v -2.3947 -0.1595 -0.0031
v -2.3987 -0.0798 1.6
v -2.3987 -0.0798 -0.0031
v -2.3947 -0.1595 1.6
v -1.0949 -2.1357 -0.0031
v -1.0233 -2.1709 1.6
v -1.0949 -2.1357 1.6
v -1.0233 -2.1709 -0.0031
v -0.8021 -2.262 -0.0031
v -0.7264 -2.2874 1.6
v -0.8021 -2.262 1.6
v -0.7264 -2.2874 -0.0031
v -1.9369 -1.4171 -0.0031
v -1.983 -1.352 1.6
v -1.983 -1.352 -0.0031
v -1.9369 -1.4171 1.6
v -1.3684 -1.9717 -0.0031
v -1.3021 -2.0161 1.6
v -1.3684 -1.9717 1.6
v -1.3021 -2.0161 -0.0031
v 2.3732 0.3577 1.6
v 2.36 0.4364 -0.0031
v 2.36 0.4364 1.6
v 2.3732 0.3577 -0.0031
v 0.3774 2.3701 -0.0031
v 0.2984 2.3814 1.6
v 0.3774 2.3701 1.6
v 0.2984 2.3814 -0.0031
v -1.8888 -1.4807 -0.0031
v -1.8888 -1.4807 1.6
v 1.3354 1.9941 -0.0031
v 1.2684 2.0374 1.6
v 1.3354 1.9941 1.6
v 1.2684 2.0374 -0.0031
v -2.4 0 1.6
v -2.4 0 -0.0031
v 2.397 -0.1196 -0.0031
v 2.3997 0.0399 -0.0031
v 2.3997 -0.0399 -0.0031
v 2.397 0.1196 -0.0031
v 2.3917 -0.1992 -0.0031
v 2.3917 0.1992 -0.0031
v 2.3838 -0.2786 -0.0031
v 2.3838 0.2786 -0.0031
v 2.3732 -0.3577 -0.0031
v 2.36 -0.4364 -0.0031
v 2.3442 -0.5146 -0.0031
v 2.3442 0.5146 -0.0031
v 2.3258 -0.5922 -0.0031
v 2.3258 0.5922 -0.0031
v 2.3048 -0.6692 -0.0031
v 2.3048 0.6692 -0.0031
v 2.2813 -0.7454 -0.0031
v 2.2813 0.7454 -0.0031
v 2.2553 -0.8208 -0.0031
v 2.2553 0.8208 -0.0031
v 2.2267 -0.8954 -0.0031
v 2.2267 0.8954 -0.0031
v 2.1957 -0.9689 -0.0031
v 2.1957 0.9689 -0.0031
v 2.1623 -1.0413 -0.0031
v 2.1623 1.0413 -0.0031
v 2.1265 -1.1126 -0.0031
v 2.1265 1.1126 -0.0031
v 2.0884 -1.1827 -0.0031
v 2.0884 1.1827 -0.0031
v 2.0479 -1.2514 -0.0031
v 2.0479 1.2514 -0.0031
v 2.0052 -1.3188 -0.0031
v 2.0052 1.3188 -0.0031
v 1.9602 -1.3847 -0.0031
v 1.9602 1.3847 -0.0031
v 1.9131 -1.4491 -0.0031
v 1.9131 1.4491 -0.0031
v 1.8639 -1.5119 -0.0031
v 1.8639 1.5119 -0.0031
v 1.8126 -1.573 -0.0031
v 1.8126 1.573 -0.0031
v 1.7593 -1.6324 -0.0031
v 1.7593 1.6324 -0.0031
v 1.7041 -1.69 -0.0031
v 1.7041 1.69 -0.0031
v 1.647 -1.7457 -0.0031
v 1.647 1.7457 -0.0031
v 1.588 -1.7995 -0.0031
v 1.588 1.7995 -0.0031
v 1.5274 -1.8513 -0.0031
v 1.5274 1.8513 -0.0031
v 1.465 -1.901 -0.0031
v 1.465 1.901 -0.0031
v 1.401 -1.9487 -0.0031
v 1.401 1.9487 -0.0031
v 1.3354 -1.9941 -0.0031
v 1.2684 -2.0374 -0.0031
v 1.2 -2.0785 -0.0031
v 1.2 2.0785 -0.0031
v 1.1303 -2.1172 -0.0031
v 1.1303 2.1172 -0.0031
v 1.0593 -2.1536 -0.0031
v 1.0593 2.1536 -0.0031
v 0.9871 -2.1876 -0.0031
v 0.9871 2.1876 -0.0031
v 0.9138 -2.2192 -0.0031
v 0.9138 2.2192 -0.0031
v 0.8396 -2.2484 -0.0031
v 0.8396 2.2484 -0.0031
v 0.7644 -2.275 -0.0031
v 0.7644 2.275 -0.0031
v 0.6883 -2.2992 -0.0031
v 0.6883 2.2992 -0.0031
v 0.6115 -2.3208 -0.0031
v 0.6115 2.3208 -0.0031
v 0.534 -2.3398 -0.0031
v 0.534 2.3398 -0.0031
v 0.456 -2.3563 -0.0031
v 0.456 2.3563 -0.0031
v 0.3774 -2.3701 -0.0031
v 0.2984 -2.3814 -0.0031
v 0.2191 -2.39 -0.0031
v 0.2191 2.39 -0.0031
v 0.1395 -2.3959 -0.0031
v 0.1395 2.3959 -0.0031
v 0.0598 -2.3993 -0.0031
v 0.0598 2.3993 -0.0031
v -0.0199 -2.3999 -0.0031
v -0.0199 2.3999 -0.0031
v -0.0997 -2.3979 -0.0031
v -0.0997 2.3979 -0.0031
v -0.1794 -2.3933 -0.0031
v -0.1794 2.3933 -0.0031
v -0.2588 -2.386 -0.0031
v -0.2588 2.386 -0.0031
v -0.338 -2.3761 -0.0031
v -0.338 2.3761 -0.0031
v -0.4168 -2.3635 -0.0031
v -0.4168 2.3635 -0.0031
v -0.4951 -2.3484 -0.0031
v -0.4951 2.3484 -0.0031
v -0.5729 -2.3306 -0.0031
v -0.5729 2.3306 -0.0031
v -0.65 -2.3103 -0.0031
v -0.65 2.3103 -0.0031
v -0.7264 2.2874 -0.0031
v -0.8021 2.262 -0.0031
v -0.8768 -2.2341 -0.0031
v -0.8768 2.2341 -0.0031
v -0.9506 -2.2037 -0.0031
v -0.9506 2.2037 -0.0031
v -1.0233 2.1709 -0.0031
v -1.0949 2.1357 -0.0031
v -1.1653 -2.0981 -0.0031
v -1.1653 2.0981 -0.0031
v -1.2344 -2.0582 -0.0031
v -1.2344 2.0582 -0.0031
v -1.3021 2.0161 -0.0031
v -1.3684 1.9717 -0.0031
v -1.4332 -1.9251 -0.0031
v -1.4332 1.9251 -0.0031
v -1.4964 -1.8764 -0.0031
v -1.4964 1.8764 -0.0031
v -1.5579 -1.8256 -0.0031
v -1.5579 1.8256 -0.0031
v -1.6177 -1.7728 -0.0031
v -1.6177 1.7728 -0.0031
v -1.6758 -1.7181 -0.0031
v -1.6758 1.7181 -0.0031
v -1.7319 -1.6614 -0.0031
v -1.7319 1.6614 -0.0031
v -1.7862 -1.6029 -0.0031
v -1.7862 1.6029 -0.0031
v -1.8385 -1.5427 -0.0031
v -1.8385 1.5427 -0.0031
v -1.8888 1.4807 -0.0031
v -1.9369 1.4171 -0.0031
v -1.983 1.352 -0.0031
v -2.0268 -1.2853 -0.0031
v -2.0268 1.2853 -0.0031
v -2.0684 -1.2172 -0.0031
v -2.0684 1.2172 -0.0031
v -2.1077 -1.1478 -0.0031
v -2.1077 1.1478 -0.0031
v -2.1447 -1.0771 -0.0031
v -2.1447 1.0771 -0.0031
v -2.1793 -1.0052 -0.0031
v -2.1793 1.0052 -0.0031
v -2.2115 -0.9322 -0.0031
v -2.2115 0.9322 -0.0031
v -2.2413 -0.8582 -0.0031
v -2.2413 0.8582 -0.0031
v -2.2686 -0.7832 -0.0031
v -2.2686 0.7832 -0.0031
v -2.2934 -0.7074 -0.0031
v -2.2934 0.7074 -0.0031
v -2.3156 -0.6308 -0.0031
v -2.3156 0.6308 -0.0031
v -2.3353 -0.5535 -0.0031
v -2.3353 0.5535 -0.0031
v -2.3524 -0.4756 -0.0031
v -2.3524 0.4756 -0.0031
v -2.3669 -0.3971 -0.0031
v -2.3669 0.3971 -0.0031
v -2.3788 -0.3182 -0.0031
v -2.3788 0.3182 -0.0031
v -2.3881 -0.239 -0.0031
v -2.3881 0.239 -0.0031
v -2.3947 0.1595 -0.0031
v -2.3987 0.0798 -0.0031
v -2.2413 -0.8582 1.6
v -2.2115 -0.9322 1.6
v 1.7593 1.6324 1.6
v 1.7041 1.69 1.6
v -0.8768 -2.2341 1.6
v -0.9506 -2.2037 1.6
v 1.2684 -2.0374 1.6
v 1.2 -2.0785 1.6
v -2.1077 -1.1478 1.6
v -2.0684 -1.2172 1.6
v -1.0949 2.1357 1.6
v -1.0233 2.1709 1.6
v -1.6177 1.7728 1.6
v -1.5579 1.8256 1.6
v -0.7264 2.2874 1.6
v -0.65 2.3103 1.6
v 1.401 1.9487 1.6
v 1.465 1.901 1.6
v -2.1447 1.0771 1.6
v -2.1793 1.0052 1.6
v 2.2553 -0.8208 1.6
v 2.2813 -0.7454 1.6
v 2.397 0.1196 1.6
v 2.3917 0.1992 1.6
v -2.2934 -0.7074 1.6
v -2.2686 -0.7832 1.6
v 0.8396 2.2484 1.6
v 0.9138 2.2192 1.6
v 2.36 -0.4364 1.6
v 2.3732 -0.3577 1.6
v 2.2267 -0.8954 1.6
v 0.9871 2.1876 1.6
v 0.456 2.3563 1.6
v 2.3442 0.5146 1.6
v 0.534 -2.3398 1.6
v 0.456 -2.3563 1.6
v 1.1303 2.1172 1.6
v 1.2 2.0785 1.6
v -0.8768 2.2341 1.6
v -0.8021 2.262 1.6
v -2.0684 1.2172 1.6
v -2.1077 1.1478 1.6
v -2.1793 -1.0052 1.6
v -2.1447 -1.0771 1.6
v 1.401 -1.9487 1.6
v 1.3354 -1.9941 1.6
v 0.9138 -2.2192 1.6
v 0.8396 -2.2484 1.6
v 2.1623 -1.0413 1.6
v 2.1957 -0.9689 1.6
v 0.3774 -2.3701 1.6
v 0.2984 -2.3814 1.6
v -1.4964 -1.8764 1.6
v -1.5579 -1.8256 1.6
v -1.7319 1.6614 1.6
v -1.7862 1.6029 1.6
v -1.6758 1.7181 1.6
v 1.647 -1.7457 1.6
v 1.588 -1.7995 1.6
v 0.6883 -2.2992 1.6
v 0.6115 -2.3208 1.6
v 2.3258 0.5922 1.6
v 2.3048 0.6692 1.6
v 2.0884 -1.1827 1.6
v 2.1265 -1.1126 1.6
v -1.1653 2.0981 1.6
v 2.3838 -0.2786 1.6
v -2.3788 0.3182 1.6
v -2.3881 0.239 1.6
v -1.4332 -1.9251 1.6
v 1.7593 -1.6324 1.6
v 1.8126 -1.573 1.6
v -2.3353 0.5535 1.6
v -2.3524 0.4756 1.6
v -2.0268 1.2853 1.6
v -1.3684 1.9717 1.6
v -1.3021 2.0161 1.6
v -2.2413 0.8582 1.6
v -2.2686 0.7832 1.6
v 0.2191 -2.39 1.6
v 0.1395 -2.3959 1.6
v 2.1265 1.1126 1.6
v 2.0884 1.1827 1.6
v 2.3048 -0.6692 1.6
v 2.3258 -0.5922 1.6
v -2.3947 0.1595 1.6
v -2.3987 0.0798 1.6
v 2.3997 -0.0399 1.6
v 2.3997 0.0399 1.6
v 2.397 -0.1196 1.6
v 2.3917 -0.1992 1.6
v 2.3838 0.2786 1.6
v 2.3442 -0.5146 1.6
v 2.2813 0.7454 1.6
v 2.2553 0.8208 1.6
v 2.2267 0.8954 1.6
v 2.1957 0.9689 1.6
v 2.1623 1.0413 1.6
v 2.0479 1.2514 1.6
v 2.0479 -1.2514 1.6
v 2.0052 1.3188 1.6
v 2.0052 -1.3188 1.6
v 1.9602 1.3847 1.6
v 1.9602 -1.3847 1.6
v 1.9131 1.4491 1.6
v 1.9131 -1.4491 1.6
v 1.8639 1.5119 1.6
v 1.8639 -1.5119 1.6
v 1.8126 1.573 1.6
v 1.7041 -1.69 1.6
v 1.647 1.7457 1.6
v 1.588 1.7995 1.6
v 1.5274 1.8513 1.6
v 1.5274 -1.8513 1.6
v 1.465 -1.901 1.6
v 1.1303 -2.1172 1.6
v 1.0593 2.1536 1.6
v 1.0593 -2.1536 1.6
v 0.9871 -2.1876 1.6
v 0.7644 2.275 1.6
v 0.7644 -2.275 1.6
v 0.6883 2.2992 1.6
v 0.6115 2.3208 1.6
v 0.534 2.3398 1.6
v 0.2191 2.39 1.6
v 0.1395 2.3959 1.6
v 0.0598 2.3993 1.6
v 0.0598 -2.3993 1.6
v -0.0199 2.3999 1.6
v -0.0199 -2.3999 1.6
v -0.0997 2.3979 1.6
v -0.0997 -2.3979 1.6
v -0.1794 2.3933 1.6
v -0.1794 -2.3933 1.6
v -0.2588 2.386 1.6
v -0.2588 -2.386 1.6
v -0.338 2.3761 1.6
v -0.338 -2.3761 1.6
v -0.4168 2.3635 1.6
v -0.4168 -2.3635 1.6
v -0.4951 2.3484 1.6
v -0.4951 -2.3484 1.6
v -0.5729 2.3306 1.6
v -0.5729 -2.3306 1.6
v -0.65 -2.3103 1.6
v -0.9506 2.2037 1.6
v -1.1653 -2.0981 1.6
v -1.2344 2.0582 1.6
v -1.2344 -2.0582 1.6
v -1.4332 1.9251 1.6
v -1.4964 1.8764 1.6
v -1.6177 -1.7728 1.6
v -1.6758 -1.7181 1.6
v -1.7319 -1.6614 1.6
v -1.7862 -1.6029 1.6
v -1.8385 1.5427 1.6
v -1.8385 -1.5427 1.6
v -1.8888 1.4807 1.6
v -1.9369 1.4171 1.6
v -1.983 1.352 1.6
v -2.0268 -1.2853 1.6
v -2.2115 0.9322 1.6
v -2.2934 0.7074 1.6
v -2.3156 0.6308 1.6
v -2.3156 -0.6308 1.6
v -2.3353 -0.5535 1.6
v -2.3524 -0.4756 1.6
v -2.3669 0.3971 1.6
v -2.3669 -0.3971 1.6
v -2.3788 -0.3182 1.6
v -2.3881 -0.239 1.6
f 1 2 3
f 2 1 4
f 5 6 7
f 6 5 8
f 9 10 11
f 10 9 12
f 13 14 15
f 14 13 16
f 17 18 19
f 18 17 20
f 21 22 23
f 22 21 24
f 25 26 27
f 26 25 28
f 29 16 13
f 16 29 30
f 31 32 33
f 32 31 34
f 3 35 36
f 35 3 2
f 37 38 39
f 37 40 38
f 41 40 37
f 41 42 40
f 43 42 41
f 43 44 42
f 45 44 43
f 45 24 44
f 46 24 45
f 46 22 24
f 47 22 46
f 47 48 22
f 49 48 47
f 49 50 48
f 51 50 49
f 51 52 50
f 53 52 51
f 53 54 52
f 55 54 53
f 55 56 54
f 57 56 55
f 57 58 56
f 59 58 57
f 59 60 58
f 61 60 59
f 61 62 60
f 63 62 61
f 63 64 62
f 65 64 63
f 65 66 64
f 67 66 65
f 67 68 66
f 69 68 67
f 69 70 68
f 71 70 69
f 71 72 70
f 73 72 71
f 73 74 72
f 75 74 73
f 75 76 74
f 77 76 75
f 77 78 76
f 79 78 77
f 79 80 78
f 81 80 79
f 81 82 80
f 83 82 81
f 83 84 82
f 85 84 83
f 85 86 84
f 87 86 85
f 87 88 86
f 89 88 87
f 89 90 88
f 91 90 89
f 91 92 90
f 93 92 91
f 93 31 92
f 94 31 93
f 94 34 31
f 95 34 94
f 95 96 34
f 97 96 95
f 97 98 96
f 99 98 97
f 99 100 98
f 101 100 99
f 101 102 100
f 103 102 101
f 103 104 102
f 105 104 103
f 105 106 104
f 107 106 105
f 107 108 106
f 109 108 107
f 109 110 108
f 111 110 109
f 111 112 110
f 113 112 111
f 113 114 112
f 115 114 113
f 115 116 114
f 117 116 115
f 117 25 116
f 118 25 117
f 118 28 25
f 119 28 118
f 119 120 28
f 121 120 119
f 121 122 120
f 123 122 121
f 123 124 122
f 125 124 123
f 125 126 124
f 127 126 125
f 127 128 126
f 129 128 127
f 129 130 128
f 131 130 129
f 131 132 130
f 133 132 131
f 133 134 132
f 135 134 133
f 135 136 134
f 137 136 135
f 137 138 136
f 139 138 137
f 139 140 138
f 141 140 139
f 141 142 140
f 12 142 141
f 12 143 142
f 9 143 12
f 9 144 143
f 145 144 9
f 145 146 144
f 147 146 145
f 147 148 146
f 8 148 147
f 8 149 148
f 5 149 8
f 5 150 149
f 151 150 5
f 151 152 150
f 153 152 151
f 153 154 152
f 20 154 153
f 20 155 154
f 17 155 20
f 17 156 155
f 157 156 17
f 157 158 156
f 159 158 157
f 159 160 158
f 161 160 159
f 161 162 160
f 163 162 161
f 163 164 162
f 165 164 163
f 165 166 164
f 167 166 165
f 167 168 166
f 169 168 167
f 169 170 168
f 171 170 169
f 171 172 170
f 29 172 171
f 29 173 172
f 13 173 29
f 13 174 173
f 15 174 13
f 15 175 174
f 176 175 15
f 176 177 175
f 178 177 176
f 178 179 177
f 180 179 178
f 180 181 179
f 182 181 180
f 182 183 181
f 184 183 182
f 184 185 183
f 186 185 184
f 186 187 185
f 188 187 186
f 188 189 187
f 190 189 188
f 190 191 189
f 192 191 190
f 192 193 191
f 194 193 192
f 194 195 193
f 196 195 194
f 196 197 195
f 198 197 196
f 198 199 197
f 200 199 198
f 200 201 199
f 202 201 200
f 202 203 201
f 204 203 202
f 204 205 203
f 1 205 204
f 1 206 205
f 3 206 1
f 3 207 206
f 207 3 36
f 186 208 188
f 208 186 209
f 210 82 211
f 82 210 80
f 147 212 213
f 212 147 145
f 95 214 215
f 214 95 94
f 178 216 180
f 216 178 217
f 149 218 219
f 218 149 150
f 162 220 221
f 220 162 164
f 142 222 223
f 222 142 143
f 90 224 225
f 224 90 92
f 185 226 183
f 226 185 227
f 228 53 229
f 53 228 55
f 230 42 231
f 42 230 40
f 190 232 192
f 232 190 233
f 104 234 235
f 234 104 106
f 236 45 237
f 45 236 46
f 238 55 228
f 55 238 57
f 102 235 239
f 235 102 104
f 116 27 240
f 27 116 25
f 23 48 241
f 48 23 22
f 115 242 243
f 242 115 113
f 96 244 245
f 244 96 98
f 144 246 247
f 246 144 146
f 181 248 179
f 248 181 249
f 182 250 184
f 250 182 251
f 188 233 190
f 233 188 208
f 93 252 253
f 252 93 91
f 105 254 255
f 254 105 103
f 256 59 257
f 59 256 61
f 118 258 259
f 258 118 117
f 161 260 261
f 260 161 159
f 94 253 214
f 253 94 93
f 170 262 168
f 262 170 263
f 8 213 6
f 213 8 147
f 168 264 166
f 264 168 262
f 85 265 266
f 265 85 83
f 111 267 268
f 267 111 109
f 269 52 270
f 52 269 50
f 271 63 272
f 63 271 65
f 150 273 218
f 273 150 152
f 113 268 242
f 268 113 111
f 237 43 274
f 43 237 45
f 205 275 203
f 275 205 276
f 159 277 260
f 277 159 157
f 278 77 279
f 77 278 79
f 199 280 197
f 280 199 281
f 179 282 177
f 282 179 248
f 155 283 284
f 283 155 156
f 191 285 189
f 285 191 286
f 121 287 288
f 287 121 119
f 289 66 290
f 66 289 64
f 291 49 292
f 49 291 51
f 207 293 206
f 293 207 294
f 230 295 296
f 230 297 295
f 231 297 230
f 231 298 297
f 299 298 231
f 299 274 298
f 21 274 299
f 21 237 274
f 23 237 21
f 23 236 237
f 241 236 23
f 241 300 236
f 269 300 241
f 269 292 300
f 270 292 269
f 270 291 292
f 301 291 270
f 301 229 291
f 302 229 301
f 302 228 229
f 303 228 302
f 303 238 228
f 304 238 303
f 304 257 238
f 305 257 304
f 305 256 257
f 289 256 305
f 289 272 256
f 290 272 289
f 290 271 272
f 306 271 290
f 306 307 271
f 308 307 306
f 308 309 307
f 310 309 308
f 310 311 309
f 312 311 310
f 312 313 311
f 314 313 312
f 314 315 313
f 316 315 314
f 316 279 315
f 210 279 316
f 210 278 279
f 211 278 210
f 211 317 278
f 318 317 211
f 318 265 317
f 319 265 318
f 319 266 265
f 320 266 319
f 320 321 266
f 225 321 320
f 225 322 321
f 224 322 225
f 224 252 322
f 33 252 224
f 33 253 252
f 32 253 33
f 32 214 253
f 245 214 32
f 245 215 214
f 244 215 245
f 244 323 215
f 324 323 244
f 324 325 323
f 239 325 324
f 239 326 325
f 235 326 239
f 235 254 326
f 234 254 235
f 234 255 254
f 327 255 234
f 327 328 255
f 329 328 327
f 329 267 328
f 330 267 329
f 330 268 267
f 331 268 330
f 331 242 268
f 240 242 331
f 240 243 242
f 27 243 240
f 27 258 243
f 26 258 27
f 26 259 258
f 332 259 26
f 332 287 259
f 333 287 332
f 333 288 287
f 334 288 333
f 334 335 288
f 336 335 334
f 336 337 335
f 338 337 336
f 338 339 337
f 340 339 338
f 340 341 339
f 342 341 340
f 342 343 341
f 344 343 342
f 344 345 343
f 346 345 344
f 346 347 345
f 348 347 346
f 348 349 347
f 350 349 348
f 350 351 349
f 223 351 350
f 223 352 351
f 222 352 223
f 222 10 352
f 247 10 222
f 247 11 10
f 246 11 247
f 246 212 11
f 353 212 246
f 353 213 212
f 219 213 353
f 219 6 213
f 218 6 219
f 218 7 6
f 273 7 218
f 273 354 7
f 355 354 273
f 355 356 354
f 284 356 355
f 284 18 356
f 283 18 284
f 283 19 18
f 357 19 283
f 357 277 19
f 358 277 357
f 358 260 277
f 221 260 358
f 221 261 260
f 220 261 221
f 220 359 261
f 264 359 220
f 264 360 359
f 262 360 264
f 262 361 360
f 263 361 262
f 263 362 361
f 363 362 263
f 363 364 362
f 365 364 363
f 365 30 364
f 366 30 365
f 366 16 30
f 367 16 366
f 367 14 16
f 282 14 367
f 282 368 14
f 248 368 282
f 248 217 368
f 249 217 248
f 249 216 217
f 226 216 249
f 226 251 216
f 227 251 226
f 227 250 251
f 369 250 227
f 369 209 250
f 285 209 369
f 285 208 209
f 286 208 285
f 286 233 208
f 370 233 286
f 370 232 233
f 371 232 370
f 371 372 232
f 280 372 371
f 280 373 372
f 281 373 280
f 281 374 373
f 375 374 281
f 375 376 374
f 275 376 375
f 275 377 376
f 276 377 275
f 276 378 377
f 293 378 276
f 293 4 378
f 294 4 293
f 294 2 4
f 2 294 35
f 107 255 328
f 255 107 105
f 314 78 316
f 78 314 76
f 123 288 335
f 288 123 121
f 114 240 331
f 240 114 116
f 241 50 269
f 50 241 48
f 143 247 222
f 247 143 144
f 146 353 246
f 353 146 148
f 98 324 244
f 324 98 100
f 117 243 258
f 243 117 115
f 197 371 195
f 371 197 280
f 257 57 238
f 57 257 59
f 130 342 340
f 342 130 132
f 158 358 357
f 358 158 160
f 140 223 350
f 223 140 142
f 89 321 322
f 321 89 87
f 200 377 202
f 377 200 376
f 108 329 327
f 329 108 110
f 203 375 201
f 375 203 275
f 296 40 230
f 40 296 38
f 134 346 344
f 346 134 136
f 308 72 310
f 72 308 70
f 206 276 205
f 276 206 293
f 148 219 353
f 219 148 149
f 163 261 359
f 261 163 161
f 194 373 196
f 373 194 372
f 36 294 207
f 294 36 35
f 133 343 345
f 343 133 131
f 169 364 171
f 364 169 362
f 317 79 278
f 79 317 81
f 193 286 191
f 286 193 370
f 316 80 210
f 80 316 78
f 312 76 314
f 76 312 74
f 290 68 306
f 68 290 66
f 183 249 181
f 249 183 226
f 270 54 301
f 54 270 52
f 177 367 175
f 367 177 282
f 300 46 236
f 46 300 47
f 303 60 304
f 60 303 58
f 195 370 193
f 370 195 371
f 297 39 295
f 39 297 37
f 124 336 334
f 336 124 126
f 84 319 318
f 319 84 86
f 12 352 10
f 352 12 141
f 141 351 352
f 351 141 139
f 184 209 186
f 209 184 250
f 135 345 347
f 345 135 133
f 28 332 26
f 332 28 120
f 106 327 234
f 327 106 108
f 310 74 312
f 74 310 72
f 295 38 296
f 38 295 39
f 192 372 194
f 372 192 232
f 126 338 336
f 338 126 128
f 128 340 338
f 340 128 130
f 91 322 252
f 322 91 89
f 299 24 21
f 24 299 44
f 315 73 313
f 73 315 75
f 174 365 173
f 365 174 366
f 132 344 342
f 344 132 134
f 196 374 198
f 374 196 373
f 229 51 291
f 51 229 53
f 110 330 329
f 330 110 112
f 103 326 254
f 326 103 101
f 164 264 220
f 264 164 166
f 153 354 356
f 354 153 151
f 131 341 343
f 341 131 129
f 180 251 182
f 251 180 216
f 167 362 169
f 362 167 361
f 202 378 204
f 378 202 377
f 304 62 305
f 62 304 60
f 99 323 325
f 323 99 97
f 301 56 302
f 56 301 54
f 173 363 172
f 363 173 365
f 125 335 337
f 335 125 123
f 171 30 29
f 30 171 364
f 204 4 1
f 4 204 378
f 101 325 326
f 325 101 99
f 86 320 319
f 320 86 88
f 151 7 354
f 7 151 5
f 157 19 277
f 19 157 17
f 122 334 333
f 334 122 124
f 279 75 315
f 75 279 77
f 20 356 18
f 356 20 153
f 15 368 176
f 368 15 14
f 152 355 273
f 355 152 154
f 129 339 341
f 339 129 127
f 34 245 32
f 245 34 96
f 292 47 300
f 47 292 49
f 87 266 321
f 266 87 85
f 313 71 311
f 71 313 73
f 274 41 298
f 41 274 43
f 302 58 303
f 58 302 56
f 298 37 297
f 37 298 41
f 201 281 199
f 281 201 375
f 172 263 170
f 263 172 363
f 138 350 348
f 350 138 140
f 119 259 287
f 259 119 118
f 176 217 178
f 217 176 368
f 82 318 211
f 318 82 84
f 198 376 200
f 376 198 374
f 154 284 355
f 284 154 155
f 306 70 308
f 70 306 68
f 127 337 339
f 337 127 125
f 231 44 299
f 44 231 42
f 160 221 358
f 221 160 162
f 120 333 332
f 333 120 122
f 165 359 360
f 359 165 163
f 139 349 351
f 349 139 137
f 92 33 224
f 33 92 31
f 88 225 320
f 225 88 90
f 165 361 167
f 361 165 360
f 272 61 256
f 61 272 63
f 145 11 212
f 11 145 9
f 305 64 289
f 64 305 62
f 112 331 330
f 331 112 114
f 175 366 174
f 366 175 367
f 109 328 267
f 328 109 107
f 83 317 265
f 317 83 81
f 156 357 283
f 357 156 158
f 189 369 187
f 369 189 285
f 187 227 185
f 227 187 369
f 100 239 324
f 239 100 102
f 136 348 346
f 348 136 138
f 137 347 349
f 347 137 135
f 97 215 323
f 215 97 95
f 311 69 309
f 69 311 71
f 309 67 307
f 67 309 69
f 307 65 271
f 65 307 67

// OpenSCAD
use <../lib.scad>
use <3005ptd.scad>
$fa=1; $fs=0.2;
function ldraw_lib__3005_d(realsolid=false) = [
// 0 ~Moved to 3005ptd
// 0 Name: 3005-d.dat
// 0 Author: [PTadmin]
// 0 !LDRAW_ORG Part UPDATE 2004-03
// 0 !LICENSE Licensed under CC BY 4.0 : see CAreadme.txt
// 
// 0 BFC CERTIFY CCW
  [0,"BFC","CERTIFY"],
  [0,"BFC","CCW"],
// 
// 0 !HISTORY 1998-12-15 [PTadmin] Official Update 1998-10
// 0 !HISTORY 2004-09-15 [PTadmin] Official Update 2004-03
// 0 !HISTORY 2007-05-11 [PTadmin] Header formatted for Contributor Agreement
// 0 !HISTORY 2008-07-01 [PTadmin] Official Update 2008-01
// 
// 
// 1 16 0 0 0 1 0 0 0 1 0 0 0 1 3005ptd.dat
  [1,16,0,0,0,1,0,0,0,1,0,0,0,1, ldraw_lib__3005ptd(realsolid)],
];
module ldraw_lib__3005_d(step=0, col=false, unit=2/5, alt=false, line=0.2, solid=!$preview)
    makepoly(ldraw_lib__3005_d(solid), step=step, col=col, unit=unit, alt=alt, line=line, solid=solid);
ldraw_lib__3005_d(line=0.2);
